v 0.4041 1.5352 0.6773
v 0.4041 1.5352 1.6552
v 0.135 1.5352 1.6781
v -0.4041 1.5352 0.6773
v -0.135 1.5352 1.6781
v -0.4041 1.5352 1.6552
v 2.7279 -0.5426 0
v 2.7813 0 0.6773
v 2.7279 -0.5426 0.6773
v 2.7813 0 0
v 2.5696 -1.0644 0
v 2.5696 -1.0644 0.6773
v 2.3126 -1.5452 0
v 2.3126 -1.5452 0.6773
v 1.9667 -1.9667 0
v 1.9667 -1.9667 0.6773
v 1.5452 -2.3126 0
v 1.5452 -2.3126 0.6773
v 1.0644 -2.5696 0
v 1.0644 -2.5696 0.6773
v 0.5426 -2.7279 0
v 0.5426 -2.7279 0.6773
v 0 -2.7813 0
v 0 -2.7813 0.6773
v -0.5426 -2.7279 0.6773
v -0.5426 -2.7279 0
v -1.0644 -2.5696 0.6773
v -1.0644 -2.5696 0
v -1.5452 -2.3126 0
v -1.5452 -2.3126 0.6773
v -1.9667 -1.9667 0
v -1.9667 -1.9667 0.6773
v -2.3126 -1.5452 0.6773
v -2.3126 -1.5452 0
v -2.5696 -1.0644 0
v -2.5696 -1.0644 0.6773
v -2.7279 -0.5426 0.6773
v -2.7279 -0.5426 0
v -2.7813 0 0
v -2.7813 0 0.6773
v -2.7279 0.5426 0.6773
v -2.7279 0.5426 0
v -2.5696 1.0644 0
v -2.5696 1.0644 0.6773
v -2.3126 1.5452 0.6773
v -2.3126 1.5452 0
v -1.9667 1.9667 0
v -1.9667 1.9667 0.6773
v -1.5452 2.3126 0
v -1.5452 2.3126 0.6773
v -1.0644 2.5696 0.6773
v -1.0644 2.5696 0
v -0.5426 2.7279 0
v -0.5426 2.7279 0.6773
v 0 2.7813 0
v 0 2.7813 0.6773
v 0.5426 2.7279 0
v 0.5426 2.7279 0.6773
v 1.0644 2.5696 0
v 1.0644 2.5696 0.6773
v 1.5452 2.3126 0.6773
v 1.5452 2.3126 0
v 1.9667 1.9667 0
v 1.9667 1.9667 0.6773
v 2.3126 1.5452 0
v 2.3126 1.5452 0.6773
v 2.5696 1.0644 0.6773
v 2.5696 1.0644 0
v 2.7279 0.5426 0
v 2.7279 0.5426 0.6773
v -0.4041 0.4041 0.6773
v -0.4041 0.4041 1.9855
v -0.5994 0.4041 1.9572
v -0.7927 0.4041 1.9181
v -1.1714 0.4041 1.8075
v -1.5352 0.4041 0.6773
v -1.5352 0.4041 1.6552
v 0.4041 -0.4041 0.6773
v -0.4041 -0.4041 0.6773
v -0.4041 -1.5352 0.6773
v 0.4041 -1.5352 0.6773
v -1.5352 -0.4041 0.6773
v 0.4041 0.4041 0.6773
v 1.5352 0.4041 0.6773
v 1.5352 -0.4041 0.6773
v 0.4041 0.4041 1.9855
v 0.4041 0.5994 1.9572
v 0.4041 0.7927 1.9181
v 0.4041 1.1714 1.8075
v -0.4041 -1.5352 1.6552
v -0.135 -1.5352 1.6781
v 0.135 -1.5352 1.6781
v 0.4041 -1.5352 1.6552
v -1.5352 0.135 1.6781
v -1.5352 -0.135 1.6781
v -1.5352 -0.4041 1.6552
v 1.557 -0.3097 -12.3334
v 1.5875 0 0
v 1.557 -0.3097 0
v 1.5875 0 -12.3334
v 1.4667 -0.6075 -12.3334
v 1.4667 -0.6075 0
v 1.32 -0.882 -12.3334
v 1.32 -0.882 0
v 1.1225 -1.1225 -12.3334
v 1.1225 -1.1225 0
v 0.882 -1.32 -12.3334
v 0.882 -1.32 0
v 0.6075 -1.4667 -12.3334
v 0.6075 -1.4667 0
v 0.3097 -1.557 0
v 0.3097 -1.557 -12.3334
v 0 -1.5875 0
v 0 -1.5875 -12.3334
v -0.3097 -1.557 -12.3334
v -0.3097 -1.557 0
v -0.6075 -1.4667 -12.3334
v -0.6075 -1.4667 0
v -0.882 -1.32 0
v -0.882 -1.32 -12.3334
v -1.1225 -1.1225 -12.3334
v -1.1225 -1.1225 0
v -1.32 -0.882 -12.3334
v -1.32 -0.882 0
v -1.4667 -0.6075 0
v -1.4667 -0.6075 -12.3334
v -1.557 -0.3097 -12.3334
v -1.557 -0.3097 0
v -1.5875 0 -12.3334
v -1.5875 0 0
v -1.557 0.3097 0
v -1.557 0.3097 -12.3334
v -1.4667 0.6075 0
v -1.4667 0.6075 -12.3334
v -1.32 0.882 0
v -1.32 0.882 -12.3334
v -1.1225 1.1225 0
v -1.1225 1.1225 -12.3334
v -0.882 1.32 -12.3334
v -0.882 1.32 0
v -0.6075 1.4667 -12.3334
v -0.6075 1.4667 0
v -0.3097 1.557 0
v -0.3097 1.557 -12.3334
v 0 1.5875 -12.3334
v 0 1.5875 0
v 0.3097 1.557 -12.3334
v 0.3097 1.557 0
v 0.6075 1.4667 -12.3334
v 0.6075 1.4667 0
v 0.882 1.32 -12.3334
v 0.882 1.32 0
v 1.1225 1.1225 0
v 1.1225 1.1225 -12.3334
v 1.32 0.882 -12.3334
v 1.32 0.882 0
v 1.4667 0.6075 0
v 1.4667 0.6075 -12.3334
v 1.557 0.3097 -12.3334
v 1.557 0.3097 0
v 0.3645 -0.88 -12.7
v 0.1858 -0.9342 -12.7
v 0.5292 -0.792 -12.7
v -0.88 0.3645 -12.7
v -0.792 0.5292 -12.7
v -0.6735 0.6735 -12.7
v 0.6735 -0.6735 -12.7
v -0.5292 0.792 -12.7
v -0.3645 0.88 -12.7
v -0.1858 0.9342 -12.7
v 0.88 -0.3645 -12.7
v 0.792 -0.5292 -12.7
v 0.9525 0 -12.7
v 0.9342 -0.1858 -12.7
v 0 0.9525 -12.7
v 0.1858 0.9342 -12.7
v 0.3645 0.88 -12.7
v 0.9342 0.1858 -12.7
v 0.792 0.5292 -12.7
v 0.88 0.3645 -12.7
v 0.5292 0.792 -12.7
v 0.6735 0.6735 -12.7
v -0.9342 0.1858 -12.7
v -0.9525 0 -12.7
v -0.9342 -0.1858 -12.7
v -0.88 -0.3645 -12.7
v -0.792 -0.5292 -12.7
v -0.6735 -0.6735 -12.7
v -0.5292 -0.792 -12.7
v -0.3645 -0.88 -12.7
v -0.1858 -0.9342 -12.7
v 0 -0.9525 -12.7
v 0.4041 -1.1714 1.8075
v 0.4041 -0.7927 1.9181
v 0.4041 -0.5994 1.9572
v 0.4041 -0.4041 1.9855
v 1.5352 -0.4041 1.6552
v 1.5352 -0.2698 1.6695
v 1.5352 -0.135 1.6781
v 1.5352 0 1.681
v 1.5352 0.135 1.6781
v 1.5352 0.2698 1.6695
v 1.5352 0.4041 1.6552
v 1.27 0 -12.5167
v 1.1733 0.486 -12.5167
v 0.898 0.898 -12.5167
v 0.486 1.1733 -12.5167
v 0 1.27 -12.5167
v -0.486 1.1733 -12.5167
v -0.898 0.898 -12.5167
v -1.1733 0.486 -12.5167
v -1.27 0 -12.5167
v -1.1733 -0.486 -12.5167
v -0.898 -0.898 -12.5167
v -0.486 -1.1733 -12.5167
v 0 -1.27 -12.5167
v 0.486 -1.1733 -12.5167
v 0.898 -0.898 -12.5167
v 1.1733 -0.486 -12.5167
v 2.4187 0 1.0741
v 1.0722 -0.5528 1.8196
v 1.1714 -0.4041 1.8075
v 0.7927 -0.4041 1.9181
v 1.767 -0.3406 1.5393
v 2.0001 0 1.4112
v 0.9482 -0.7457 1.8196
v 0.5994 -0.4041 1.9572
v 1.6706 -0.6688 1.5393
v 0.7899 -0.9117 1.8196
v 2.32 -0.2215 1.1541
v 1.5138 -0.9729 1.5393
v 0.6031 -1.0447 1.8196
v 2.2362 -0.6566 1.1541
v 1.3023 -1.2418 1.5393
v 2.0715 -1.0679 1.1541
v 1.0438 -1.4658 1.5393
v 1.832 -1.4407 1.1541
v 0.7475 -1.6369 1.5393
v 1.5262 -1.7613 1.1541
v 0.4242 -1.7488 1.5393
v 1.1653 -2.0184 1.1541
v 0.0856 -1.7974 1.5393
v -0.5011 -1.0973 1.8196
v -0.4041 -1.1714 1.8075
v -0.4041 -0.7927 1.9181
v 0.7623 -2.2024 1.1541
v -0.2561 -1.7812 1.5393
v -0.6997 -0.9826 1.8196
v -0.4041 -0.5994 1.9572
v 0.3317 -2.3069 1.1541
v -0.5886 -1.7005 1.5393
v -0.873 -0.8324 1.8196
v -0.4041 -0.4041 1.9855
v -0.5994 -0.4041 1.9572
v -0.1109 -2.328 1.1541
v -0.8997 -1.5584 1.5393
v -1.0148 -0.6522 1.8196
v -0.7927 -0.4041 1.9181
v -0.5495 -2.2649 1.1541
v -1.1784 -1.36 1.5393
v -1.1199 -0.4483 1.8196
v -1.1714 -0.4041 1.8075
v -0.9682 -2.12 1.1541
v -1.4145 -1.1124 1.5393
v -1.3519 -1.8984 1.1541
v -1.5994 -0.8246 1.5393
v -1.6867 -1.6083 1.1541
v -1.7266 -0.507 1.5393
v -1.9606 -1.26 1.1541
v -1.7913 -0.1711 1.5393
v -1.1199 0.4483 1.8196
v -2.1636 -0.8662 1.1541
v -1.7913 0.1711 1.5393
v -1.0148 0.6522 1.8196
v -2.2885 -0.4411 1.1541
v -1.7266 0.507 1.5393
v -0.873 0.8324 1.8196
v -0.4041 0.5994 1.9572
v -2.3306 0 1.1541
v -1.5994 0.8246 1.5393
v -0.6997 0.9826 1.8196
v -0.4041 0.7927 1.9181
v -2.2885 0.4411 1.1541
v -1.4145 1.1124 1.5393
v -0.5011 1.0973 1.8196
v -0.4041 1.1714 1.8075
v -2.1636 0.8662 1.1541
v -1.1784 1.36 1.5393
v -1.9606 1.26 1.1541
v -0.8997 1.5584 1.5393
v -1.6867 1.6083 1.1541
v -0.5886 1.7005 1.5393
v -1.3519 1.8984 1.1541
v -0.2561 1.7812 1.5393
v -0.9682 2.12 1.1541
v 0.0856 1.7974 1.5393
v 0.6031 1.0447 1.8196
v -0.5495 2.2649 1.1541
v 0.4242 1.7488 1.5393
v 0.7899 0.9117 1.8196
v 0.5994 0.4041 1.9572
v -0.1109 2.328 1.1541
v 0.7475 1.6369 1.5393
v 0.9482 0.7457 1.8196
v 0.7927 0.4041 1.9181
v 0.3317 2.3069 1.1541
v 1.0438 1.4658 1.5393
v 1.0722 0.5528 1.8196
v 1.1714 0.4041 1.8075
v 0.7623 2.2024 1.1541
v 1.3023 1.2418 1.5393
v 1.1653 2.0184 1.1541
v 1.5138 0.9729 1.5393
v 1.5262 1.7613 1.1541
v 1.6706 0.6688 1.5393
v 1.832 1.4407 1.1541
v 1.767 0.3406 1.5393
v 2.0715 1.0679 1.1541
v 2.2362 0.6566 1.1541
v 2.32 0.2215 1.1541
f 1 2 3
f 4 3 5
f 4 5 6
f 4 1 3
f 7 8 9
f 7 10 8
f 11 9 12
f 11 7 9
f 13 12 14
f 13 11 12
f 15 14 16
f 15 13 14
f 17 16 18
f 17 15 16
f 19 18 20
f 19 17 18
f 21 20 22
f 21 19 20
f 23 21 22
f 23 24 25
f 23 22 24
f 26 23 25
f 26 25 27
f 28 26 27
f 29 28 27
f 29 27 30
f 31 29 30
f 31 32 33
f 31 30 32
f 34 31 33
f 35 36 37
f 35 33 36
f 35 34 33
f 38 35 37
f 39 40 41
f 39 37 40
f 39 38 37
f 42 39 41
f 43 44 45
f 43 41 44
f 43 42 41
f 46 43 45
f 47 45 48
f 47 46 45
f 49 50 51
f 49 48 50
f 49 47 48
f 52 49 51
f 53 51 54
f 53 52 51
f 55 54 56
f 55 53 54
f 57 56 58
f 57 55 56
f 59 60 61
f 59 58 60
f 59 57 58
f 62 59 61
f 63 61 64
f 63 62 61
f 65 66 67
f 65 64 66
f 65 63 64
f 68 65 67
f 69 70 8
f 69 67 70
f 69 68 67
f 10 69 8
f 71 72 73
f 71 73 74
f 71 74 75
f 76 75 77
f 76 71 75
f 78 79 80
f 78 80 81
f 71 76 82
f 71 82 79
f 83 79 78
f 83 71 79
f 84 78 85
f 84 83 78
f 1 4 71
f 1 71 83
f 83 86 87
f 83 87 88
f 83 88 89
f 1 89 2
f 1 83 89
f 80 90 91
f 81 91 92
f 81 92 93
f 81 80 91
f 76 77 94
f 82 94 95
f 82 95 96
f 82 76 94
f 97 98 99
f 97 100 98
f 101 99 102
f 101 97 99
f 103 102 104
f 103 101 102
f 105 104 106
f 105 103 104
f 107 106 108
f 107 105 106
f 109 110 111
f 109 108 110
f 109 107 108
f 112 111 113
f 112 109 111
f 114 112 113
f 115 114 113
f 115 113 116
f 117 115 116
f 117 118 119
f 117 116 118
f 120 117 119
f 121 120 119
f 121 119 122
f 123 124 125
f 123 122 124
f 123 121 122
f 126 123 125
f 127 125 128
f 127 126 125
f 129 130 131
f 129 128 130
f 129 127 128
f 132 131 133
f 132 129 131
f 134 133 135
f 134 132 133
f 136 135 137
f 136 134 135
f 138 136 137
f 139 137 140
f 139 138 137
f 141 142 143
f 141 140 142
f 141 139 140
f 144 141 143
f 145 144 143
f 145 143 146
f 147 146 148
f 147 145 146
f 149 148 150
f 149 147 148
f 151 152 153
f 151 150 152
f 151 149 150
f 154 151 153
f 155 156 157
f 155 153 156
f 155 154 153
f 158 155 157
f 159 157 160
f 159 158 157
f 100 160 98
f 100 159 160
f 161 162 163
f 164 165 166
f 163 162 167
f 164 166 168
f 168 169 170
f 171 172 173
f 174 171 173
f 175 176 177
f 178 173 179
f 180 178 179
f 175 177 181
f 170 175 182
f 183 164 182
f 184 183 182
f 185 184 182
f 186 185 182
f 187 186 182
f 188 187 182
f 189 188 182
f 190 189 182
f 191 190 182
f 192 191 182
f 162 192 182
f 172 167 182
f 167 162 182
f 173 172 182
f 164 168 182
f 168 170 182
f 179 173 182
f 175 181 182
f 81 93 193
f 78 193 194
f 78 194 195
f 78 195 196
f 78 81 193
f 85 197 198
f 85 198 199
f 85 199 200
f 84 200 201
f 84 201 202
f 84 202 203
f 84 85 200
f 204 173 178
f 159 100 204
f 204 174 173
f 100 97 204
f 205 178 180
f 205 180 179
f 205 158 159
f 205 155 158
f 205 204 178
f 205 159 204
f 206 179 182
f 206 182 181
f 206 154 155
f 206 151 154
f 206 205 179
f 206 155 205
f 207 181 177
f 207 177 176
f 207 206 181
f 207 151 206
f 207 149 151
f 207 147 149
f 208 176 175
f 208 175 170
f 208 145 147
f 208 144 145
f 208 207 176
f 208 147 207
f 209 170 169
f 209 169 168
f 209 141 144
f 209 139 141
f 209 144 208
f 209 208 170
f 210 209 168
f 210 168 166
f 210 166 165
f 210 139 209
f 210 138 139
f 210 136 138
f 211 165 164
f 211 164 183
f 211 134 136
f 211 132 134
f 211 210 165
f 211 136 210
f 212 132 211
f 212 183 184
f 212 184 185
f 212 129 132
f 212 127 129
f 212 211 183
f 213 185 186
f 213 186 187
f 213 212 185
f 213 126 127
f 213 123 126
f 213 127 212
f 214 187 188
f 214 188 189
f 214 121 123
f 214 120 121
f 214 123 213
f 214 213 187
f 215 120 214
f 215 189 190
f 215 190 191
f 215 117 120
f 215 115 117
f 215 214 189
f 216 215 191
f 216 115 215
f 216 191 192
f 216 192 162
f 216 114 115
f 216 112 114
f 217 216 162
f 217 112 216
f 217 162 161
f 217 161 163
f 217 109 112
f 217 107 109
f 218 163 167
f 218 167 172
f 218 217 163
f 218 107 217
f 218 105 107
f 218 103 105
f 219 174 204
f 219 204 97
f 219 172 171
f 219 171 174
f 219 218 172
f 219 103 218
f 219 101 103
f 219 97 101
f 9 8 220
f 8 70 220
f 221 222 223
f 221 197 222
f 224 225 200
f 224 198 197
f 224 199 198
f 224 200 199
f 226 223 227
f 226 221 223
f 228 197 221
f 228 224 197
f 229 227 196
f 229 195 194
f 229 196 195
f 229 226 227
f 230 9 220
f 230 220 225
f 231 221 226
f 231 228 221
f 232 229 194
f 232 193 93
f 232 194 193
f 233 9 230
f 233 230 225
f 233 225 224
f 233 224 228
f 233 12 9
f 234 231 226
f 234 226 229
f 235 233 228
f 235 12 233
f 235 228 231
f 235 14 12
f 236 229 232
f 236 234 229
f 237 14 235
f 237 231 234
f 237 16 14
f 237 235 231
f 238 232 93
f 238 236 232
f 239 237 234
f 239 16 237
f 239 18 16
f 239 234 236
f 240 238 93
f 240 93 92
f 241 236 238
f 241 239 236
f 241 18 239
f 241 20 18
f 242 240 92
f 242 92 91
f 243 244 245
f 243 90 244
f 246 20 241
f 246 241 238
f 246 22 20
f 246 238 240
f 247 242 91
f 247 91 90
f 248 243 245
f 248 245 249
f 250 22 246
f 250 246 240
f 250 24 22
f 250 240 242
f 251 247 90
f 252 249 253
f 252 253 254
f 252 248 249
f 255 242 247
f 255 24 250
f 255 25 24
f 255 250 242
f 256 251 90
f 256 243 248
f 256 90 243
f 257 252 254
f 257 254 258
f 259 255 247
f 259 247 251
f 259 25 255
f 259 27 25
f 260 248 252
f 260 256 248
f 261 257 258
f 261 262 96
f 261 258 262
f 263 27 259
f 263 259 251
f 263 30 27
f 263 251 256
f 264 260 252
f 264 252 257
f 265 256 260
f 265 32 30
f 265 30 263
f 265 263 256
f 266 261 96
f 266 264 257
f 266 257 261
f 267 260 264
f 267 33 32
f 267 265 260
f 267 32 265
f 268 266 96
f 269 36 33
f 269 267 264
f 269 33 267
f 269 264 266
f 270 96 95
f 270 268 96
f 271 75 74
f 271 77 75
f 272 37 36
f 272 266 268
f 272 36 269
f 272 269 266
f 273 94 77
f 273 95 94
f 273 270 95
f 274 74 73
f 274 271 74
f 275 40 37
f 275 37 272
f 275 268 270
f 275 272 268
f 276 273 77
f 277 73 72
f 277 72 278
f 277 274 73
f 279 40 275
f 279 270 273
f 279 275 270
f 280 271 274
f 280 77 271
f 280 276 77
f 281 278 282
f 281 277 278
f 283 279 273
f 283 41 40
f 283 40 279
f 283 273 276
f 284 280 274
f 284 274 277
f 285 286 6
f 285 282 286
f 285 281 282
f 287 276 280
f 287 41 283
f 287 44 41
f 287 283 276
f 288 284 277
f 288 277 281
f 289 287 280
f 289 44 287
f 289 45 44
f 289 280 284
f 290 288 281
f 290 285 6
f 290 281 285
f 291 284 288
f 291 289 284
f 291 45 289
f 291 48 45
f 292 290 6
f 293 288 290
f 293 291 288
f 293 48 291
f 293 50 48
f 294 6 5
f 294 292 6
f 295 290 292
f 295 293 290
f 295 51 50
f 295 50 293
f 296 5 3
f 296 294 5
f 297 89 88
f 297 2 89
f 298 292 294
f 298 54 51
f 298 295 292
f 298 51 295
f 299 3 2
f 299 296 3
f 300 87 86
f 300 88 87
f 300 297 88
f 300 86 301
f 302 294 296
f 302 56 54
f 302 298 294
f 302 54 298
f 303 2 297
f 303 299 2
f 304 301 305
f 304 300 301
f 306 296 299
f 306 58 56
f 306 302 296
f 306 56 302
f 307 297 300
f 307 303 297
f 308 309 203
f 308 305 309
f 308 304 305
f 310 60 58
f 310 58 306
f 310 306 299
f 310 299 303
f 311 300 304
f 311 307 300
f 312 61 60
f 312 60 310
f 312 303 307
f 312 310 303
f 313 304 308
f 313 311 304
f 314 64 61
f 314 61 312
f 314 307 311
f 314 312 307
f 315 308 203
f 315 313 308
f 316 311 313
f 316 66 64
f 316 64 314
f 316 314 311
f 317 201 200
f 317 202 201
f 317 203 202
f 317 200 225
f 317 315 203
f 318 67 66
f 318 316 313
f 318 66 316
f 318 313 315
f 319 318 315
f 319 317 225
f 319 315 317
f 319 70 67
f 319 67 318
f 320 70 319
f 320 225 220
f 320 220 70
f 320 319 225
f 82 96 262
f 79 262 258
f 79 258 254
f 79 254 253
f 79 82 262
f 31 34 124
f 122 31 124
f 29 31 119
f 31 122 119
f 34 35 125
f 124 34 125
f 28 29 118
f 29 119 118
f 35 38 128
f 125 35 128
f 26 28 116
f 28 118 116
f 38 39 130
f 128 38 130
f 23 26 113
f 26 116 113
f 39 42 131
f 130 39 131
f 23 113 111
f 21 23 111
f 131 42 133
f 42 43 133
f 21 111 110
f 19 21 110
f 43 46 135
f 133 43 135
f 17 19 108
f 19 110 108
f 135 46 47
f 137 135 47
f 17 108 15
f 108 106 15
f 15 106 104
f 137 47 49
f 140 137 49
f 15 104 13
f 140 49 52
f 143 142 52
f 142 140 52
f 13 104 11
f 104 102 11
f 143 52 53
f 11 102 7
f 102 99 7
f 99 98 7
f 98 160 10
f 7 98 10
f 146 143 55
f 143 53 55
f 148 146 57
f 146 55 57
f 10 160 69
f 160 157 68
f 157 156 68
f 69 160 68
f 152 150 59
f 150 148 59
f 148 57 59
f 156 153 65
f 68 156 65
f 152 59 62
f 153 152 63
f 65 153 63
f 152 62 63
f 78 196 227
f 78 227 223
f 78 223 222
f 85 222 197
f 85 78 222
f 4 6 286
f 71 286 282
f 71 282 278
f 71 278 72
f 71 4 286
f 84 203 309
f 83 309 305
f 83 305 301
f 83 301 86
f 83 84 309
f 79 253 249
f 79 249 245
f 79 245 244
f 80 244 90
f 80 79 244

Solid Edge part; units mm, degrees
sketch "Sketch1" plane through (0, 0, 0) normal (0, -1, 0) x (1, 0, 0)
  arc A0 (0, 2.032) -> (2.7813, 0.6773) centre (0, -1.5005) cw
  line L0 (2.7813, 0.6773) -> (2.7813, 0)
  line L1 (2.7813, 0) -> (1.5875, 0)
  line L2 (1.5875, 0) -> (1.5875, -12.3334)
  line L3 (1.5875, -12.3334) -> (0.9525, -12.7)
  line L4 (0.9525, -12.7) -> (0, -12.7)
  dimension "D1" = 12.7
  dimension "D2" = 2.032
  dimension "D3" = 0.6773
revolve "RevolvedProtrusion1" add sketch "Sketch1" angle 360 about axis through (0, 0, 0) along (0, 0, 1)
sketch "Sketch2" plane through (0, 0, 0.6773) normal (0, 0, 1) x (1, 0, 0)
  line L0 (0.4041, -0.4041) -> (1.5352, -0.4041)
  line L1 (1.5352, -0.4041) -> (1.5352, 0.4041)
  line L2 (1.5352, 0.4041) -> (0.4041, 0.4041)
  line L3 (0.4041, 0.4041) -> (0.4041, 1.5352)
  line L4 (0.4041, 1.5352) -> (-0.4041, 1.5352)
  line L5 (-0.4041, 1.5352) -> (-0.4041, 0.4041)
  line L6 (-0.4041, 0.4041) -> (-1.5352, 0.4041)
  line L7 (-1.5352, 0.4041) -> (-1.5352, -0.4041)
  line L8 (-1.5352, -0.4041) -> (-0.4041, -0.4041)
  line L9 (-0.4041, -0.4041) -> (-0.4041, -1.5352)
  line L10 (-0.4041, -1.5352) -> (0.4041, -1.5352)
  line L11 (0.4041, -1.5352) -> (0.4041, -0.4041)
extrude "Cutout1" cut sketch "Sketch2" along normal through all
cosmetic_thread "Thread1" size "#5-40 UNC"
properties material "Acier galvanisé"
